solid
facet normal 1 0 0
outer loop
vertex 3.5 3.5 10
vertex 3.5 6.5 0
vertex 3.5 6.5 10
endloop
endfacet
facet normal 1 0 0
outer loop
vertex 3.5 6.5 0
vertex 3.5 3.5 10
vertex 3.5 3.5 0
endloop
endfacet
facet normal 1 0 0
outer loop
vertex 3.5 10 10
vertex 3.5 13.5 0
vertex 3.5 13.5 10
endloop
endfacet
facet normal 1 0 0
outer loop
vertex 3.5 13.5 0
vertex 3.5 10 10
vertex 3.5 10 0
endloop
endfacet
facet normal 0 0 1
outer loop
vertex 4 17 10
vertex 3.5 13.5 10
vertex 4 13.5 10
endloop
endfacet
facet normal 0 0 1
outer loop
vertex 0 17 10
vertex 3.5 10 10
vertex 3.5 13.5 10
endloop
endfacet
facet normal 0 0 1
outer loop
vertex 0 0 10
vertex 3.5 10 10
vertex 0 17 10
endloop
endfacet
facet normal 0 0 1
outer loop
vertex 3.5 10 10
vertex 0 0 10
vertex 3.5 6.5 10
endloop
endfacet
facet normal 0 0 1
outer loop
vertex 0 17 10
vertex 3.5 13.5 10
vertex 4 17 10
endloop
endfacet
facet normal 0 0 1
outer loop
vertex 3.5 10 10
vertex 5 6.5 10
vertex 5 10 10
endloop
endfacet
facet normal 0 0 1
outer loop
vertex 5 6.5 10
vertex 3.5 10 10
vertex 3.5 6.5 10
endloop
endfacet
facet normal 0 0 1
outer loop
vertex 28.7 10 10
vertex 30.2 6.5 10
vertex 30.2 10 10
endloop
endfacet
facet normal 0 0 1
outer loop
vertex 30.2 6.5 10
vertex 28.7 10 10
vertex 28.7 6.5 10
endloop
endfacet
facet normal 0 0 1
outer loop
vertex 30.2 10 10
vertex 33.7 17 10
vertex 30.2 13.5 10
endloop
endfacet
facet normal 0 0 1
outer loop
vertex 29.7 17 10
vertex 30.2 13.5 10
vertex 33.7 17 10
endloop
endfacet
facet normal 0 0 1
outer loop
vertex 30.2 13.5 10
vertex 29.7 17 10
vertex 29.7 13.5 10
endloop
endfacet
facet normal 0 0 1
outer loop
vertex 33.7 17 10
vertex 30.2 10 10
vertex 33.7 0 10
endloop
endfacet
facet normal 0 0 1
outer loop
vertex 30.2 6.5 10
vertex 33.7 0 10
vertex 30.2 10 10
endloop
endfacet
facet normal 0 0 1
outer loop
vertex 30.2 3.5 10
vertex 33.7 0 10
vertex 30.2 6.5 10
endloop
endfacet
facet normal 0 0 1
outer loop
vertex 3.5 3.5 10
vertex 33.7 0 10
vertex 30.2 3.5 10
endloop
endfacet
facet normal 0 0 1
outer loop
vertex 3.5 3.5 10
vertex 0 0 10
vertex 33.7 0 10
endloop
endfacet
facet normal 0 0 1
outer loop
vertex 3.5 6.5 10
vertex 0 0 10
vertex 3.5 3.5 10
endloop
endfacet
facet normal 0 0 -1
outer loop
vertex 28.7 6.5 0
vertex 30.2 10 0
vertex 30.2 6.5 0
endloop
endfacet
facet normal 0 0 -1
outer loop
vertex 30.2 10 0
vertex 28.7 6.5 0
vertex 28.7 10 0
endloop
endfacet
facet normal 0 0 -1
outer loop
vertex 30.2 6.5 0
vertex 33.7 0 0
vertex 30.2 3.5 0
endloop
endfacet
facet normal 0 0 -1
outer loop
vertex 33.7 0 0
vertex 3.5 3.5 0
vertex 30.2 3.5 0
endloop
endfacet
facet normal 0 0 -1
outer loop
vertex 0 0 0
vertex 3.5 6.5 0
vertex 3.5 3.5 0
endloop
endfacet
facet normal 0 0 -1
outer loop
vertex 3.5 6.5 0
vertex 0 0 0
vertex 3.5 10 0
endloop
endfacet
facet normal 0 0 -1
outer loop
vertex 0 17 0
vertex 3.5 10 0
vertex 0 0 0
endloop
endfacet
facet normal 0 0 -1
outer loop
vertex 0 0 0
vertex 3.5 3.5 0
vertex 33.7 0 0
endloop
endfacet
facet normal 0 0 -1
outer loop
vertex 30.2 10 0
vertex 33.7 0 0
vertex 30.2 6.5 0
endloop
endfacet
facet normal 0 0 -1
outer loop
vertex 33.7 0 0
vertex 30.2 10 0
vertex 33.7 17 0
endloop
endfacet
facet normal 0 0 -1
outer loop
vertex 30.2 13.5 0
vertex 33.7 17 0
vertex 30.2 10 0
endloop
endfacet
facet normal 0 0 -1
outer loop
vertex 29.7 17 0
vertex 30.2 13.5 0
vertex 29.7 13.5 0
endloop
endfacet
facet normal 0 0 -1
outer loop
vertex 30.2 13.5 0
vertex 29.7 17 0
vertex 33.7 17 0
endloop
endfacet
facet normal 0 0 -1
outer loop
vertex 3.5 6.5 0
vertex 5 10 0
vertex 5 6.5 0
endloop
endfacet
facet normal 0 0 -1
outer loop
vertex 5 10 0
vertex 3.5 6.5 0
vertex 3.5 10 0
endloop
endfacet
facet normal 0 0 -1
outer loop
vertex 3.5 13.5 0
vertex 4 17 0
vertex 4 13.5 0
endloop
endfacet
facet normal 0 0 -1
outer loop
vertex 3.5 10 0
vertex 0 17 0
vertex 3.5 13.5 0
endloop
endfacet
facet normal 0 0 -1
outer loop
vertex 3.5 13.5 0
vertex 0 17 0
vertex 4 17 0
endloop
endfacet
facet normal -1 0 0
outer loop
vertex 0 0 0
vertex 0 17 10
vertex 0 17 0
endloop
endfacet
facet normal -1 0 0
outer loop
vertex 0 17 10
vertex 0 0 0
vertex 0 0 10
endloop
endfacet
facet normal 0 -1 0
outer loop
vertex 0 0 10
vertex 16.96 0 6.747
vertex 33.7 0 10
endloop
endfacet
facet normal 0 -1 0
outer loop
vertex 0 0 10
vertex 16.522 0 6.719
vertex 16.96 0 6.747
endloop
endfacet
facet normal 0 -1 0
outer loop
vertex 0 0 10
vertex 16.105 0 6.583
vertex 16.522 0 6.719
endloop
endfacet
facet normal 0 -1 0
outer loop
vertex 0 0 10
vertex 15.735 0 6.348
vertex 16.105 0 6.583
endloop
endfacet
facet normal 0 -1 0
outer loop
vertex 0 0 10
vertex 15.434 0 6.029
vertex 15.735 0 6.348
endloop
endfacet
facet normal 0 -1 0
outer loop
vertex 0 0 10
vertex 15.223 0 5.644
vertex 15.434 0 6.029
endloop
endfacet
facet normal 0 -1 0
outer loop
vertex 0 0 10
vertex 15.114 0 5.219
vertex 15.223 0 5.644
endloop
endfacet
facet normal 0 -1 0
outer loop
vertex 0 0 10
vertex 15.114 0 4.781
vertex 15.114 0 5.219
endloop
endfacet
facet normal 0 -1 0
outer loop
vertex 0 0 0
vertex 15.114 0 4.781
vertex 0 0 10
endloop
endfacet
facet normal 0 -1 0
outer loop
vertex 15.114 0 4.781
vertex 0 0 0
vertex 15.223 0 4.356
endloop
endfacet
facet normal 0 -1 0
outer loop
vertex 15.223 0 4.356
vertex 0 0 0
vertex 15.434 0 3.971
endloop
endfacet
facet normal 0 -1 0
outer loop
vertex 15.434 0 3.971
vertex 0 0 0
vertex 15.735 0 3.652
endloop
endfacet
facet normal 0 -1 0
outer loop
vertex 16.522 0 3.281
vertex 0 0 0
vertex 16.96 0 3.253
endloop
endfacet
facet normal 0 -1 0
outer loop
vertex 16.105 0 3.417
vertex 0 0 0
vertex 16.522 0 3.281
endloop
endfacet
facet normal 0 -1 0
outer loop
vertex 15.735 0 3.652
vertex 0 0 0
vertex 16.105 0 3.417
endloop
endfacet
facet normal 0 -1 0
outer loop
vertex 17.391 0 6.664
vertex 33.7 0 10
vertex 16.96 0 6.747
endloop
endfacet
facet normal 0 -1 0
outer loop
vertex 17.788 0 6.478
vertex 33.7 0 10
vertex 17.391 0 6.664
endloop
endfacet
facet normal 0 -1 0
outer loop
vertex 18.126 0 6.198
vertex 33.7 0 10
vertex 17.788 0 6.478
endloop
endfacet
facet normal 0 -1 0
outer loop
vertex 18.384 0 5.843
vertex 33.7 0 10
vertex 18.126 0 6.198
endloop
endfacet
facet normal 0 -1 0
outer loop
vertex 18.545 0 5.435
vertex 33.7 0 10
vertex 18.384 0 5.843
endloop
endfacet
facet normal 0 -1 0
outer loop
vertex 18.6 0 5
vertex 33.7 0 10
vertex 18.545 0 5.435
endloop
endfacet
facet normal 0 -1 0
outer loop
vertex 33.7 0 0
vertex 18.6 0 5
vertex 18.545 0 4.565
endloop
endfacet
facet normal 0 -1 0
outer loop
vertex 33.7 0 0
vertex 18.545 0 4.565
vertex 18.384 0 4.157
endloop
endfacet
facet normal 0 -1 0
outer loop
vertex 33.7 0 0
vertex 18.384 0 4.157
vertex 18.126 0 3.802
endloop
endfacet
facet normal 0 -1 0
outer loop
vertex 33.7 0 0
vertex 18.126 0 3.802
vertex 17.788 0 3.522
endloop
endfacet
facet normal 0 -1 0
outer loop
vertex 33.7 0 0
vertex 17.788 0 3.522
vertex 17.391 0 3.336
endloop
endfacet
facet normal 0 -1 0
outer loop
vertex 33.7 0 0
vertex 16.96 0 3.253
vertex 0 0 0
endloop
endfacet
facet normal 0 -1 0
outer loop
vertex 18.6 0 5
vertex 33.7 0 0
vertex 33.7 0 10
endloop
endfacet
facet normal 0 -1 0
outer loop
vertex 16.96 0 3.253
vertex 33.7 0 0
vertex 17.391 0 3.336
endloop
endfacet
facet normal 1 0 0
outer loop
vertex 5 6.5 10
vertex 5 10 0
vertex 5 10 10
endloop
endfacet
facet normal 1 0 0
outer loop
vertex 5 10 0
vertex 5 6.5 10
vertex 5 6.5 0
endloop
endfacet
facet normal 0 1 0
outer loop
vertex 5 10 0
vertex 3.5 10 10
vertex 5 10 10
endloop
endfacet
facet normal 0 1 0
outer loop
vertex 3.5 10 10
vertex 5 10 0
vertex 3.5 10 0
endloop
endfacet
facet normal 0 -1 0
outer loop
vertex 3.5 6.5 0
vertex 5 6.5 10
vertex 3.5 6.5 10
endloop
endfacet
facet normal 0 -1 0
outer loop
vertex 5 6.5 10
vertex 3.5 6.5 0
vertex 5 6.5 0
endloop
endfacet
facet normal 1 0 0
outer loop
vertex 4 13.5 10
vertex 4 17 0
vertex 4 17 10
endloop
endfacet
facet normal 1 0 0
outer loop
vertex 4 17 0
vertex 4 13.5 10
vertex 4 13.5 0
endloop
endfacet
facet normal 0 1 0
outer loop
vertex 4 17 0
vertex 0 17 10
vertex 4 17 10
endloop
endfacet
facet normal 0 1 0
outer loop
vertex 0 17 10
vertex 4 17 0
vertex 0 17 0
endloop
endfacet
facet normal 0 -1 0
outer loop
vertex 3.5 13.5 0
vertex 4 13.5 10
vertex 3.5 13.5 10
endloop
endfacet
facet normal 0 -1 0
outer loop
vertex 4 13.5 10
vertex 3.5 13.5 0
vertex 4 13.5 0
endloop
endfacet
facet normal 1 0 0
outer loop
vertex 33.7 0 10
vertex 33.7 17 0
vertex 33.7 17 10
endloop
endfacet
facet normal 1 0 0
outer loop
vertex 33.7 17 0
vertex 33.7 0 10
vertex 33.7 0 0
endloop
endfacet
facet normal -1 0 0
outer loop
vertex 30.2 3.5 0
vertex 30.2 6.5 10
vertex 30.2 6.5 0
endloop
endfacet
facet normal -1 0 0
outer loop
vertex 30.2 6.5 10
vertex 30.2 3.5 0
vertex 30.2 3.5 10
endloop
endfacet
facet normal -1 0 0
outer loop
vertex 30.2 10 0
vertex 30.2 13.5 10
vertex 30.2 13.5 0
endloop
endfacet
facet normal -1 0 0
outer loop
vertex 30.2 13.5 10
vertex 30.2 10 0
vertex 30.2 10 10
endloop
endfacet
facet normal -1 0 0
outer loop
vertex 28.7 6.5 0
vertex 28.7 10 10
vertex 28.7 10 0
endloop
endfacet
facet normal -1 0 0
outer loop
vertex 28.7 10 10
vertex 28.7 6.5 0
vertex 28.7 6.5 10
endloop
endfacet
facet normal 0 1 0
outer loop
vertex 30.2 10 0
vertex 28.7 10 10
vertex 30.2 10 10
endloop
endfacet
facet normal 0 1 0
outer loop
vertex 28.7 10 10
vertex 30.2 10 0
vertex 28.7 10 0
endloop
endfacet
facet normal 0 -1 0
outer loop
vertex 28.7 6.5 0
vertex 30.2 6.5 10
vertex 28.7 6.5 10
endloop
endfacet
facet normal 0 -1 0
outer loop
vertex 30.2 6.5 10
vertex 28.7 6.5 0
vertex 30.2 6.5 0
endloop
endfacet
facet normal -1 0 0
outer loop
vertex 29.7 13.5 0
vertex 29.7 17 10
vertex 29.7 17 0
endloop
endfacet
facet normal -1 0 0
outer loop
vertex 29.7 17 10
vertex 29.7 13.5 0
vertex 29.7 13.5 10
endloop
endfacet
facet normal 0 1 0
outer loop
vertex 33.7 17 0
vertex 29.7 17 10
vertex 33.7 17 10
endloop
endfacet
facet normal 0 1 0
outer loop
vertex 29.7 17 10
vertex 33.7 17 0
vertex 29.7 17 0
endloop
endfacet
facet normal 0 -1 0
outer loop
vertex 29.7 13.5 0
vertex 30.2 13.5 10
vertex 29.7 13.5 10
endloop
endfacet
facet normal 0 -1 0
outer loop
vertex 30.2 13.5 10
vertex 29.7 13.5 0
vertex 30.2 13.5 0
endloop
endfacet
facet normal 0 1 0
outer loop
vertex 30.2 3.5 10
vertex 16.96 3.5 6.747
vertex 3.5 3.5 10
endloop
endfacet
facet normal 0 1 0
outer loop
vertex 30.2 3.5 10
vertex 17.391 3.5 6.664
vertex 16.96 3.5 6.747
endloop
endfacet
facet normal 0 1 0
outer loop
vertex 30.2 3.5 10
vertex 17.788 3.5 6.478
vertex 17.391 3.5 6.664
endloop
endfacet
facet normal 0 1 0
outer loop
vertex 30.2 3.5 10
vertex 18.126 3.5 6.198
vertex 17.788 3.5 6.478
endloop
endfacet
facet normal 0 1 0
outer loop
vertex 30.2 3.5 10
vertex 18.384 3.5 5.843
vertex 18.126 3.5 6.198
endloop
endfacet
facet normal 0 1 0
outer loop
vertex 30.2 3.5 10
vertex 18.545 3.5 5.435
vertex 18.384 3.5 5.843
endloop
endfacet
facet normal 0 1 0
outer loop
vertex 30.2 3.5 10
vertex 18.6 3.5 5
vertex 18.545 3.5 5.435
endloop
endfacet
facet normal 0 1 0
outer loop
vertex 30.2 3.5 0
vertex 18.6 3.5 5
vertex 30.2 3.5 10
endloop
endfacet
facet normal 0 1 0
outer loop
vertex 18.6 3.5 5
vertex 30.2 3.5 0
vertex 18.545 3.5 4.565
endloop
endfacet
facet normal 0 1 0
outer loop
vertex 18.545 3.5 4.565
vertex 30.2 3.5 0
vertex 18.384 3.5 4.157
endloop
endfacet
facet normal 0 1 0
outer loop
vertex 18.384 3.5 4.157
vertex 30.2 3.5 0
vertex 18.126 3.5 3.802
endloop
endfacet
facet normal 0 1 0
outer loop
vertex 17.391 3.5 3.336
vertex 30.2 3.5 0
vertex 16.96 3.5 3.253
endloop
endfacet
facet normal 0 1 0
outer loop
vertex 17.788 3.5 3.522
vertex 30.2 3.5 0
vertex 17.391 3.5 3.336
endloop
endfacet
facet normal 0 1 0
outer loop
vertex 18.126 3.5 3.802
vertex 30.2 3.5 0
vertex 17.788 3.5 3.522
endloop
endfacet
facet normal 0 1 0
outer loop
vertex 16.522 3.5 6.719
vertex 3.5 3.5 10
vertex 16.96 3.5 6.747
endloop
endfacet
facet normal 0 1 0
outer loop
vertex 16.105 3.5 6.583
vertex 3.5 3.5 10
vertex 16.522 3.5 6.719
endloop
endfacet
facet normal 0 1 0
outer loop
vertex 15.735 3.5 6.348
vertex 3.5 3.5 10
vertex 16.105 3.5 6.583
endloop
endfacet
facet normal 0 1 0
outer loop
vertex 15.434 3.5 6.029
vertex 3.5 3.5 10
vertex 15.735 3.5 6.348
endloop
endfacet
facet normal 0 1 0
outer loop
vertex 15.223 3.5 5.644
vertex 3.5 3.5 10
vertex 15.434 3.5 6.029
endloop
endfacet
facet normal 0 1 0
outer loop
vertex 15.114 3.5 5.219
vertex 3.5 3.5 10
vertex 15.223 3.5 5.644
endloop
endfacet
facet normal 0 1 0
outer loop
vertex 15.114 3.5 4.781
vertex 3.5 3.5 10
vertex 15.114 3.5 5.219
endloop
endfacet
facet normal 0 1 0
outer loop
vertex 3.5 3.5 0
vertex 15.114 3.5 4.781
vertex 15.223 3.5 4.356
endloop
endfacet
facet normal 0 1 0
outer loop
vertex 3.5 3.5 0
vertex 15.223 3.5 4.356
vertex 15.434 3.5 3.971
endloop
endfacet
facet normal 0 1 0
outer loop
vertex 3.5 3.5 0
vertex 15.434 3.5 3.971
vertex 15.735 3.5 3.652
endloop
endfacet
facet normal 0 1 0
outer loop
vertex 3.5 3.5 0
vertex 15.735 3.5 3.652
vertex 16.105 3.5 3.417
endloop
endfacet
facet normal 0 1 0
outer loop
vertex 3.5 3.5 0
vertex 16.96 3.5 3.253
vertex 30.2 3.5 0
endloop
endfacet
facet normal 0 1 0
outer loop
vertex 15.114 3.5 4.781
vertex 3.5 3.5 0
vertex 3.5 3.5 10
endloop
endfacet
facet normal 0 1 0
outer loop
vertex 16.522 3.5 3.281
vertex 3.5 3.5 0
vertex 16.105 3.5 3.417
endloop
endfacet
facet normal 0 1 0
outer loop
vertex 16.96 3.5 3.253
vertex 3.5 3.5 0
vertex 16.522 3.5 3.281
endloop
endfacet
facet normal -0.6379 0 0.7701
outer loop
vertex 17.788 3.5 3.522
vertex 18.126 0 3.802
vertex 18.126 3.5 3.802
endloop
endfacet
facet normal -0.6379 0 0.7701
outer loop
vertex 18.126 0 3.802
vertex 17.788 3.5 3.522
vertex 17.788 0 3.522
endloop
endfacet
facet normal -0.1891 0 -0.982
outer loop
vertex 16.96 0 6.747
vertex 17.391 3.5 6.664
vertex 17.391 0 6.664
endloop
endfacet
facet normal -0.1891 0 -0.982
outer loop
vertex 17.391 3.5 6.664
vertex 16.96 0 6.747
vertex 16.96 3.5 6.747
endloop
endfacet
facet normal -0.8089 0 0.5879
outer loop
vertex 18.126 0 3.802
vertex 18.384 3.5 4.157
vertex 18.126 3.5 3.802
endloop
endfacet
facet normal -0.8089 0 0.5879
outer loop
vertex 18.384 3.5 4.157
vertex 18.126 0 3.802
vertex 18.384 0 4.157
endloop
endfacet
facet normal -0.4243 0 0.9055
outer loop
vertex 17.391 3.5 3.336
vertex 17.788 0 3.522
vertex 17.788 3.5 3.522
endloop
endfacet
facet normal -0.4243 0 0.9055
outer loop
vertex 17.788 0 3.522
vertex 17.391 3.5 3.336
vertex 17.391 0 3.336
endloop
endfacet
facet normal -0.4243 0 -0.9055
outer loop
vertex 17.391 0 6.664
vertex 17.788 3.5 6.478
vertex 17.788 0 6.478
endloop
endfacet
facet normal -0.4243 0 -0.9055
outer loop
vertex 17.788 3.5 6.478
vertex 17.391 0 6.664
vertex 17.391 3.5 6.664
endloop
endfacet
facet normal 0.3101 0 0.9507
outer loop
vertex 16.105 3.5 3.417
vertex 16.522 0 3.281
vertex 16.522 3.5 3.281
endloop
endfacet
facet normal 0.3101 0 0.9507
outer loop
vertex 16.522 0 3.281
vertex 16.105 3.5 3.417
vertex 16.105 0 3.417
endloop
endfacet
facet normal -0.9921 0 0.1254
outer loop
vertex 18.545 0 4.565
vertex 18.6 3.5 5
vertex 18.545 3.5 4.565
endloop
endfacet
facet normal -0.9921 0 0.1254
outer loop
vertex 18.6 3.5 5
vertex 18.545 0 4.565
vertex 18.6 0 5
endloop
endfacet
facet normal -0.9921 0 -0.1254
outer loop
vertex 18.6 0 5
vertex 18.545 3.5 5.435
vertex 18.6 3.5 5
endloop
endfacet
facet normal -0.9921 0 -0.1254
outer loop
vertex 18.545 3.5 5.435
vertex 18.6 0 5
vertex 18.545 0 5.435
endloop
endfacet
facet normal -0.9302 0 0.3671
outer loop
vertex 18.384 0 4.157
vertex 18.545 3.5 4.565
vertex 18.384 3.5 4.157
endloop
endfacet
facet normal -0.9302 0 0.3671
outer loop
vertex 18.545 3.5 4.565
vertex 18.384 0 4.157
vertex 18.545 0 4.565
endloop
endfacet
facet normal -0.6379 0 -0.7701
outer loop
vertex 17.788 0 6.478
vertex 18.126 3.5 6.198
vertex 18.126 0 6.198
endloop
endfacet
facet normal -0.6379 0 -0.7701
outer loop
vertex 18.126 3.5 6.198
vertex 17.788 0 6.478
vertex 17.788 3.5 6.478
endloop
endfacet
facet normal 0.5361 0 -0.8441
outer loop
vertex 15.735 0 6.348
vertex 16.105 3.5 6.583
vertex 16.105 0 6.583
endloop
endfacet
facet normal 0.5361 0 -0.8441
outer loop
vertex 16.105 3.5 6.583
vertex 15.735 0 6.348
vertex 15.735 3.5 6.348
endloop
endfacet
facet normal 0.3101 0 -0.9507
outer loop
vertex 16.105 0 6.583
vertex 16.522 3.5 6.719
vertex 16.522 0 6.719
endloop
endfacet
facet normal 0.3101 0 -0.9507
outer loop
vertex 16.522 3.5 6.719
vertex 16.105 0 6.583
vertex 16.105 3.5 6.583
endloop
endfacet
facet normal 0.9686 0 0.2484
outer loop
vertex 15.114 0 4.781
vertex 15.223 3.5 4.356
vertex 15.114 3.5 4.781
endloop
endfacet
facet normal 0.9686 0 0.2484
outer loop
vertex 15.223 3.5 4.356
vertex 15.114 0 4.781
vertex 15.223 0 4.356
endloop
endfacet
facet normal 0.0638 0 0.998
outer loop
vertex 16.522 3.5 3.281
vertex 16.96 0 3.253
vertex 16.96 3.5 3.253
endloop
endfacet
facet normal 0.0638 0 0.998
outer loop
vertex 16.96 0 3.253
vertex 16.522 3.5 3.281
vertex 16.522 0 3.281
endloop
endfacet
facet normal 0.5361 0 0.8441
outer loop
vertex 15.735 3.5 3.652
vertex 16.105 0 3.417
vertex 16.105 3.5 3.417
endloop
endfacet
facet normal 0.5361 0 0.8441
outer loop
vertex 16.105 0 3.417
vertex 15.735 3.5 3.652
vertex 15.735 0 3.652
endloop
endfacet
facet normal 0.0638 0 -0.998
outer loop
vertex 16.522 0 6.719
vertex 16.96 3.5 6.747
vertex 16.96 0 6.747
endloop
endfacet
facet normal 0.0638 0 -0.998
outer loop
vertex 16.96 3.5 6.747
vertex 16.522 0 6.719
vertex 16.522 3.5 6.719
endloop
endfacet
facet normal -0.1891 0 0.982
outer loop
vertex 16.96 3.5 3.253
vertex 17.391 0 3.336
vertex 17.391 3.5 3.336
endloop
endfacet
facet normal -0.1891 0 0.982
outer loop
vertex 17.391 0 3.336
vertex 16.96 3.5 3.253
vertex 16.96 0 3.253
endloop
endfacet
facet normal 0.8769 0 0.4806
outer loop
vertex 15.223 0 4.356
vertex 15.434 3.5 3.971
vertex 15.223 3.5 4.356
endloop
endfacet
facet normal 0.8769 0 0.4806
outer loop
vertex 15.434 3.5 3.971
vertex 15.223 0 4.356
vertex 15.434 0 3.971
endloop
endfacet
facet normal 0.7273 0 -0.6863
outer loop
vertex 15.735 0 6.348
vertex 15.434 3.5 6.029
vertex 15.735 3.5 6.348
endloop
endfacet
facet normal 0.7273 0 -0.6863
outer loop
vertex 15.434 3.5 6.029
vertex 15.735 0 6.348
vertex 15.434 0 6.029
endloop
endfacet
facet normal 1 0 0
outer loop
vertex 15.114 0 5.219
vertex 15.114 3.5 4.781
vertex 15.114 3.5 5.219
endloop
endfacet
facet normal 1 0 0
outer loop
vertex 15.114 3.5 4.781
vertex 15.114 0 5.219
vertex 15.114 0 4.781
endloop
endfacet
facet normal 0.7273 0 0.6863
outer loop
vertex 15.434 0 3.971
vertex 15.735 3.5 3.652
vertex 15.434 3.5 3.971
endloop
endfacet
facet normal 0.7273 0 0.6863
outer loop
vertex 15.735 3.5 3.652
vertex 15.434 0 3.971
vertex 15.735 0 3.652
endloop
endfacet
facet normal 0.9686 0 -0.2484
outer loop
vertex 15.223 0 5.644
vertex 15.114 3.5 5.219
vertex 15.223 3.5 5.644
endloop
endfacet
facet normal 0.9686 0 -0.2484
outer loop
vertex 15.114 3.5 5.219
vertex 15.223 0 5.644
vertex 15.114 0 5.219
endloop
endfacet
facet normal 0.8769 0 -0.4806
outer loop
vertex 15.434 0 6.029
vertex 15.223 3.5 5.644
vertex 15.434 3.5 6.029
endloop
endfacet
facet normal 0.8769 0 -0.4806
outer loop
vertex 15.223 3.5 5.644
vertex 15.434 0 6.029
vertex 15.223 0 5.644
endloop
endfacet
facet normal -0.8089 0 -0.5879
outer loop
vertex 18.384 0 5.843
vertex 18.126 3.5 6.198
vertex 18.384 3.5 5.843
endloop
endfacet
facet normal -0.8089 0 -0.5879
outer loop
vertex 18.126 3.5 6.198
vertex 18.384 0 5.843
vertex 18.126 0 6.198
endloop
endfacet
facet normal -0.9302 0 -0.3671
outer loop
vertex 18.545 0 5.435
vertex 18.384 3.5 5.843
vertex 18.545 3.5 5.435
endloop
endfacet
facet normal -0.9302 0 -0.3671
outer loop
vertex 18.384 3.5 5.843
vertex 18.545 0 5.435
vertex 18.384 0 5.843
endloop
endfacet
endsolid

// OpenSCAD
$fn = 25;
fiddyplus_width = 26.7;
fiddyplus_thickness = 1.62;

bracket_width = 10;
bracket_thickness = 3.5;
standoff_height = 10;

total_width = 2 * bracket_thickness + fiddyplus_width;

module clamp(invert=false) {
    cube([
        bracket_thickness,
        standoff_height + fiddyplus_thickness + 3,
        bracket_width,
    ]);
    translate([invert ? -1.5 : 0, standoff_height - bracket_thickness, 0])
    cube([bracket_thickness+1.5, bracket_thickness, bracket_width]);

    translate([invert ? -0.5 : 0, standoff_height + bracket_thickness, 0])
    cube([bracket_thickness+0.5, bracket_thickness, bracket_width]);
}

difference() {
    union() {
        cube([
            total_width,
            bracket_thickness,
            bracket_width
        ]);

        for (x = [
            0,
            fiddyplus_width + bracket_thickness
        ])
        translate([x, 0, 0])
        clamp(x!=0);
    }

    translate([total_width/2, -0.5, bracket_width/2])
    rotate([-90, 0, 0])
    cylinder(d=3.5,h=10);
}
